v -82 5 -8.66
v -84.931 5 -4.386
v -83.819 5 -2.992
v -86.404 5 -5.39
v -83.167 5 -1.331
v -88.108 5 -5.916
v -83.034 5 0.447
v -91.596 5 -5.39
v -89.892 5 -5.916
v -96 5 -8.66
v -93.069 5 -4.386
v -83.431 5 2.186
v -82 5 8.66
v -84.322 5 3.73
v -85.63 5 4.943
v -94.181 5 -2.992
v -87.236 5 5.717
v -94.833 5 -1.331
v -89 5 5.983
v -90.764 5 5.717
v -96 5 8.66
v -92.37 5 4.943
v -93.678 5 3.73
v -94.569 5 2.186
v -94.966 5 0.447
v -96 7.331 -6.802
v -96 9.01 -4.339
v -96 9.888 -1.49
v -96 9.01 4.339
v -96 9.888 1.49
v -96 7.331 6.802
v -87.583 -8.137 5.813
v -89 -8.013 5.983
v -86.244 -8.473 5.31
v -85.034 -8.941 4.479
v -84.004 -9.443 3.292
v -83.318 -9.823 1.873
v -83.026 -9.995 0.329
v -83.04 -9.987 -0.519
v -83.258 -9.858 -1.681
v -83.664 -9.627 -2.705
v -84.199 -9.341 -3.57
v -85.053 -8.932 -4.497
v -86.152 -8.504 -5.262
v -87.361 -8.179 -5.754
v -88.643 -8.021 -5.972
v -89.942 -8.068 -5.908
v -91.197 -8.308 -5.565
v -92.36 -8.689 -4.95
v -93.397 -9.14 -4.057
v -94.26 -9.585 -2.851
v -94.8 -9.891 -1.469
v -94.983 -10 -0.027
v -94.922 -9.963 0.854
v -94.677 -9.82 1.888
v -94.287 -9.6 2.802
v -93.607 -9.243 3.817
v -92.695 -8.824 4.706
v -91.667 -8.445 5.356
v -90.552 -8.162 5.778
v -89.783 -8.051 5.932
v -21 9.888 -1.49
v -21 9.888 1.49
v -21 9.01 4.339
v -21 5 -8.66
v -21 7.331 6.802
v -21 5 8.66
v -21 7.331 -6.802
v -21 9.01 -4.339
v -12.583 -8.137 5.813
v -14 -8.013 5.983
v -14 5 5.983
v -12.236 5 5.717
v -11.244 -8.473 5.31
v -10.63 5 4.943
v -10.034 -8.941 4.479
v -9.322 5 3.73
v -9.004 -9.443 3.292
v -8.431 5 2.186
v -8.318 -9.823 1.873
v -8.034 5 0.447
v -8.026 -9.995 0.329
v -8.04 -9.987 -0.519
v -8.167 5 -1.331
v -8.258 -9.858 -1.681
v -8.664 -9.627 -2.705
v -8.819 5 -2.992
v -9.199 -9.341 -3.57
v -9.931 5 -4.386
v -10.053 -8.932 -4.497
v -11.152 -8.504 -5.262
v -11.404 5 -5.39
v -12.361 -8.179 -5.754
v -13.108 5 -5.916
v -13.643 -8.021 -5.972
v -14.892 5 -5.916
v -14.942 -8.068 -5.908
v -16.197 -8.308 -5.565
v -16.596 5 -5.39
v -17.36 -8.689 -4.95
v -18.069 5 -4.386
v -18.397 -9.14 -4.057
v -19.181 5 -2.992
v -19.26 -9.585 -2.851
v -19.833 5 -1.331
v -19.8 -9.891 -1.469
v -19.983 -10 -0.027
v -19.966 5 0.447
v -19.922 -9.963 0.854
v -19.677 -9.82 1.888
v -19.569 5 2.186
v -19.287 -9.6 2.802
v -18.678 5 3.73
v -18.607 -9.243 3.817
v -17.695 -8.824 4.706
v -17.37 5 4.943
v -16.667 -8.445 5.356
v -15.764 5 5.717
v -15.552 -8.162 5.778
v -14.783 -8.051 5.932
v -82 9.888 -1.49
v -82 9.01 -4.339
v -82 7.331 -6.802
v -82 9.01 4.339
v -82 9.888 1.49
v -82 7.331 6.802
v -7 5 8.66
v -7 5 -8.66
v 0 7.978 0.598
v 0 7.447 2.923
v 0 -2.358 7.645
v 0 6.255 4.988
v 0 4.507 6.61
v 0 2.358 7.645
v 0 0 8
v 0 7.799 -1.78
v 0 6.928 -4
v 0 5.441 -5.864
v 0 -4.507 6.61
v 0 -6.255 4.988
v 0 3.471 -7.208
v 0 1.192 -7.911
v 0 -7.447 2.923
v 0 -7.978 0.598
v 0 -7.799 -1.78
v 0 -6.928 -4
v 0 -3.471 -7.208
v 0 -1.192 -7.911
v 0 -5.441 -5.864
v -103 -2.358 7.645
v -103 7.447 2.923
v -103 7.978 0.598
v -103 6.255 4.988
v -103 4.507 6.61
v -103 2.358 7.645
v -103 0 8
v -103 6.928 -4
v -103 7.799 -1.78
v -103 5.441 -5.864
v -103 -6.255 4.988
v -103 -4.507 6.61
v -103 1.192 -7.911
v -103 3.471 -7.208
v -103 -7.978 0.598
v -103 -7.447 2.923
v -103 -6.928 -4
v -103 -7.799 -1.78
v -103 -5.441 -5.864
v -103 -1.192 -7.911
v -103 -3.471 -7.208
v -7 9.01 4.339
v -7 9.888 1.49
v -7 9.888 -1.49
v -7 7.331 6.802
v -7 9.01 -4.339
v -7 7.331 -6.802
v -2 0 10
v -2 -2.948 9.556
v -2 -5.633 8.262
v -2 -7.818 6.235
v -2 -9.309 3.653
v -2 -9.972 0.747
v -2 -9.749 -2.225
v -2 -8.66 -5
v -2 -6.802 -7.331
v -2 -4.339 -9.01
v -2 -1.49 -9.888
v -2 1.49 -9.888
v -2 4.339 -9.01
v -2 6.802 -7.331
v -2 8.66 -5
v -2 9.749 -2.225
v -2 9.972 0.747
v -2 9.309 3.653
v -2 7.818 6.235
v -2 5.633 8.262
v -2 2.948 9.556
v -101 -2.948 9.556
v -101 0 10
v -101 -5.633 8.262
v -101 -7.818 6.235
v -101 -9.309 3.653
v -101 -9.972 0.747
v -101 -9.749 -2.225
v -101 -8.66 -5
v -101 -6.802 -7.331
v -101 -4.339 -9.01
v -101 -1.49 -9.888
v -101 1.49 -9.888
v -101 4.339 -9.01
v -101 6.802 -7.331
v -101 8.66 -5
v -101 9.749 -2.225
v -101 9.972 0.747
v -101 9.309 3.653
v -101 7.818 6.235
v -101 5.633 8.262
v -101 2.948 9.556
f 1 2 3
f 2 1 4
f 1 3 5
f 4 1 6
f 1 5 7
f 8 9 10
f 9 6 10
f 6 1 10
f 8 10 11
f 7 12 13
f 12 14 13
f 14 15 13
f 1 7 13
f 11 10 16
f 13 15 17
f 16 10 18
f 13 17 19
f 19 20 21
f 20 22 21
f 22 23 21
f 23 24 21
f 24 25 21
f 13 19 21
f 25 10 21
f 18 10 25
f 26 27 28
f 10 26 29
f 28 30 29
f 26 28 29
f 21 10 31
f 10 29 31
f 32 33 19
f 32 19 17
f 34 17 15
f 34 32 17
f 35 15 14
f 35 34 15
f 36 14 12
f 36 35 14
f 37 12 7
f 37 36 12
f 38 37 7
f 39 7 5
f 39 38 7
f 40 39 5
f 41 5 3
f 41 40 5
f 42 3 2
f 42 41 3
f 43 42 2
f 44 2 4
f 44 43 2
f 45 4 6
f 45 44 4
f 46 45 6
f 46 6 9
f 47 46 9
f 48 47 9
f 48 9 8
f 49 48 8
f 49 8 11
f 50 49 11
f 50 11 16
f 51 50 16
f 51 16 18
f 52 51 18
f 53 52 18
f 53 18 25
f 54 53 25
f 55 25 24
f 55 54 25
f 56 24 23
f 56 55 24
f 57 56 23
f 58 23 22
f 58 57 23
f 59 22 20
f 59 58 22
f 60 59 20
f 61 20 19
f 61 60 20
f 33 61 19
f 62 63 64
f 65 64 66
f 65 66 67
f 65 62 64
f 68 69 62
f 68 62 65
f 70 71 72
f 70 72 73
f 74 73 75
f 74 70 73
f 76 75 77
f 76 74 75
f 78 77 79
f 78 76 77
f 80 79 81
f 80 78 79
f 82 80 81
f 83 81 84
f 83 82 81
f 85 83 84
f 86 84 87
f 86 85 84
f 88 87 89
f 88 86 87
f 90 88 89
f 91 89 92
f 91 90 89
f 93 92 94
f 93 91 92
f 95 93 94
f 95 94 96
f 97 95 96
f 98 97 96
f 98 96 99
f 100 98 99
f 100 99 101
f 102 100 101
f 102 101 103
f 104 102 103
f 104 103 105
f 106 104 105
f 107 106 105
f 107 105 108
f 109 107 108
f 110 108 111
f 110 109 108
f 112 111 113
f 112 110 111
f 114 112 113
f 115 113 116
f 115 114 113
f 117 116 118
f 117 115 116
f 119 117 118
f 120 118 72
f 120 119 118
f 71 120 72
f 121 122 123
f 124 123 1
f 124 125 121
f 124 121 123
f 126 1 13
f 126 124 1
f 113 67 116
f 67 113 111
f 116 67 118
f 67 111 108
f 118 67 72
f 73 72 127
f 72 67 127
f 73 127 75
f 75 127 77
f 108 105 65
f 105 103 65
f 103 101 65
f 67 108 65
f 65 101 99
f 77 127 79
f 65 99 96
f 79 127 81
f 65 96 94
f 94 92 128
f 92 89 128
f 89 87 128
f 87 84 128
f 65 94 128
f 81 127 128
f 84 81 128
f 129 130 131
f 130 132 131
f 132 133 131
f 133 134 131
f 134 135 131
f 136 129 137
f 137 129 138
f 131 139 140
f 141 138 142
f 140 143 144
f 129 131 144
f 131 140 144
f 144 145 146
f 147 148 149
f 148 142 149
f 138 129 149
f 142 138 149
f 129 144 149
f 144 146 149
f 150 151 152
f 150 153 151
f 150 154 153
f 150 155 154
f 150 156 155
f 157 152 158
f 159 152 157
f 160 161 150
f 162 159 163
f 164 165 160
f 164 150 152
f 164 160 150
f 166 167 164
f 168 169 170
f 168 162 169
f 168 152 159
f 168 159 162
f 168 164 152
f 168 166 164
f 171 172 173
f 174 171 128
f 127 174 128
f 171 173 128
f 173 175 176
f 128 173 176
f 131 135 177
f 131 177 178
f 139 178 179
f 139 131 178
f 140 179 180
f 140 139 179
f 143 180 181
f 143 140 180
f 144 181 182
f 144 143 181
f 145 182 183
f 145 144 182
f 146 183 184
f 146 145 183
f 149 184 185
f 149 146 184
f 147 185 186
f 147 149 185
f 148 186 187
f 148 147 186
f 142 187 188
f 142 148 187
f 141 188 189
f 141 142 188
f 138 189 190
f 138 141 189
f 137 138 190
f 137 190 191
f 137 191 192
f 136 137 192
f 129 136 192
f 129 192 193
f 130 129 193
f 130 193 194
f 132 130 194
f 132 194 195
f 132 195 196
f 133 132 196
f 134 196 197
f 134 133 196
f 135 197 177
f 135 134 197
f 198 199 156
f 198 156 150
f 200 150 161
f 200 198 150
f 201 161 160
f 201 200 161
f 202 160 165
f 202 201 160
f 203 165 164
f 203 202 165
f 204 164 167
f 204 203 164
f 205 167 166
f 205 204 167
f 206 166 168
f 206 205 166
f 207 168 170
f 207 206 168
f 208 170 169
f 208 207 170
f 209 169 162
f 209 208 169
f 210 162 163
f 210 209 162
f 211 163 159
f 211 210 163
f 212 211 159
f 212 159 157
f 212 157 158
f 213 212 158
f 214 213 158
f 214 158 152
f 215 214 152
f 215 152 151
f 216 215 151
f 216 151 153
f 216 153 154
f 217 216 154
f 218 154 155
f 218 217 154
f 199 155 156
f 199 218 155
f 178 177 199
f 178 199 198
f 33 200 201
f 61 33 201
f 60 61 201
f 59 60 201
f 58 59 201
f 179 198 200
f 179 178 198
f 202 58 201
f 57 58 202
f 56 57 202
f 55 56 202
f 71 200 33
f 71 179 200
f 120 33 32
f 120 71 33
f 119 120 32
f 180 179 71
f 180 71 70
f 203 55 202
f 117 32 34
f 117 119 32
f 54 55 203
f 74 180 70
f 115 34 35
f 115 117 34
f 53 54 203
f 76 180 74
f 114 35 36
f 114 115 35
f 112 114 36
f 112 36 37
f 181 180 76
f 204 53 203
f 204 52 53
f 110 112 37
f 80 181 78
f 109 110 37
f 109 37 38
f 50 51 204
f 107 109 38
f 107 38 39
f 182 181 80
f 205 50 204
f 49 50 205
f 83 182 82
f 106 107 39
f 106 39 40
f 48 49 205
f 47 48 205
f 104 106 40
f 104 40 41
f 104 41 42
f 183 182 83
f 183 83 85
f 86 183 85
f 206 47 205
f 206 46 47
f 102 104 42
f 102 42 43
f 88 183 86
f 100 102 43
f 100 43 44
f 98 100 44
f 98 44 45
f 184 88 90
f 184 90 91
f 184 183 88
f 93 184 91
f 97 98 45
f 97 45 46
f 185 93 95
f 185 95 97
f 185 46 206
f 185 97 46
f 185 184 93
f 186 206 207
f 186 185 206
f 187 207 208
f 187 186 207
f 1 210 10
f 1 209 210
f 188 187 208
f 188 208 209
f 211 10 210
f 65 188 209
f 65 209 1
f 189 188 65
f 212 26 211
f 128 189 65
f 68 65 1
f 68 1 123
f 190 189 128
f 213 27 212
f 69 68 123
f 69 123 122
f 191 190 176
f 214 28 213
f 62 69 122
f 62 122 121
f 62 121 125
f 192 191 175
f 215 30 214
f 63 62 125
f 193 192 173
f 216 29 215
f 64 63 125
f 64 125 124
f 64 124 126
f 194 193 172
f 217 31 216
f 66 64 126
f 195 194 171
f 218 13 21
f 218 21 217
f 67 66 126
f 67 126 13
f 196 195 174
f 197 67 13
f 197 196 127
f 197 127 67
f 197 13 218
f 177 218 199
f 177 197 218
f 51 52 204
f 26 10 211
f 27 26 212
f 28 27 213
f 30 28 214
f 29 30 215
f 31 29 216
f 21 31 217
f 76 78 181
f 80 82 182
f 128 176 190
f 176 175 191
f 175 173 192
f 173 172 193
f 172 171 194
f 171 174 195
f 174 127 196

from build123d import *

# Parameters (mm, degrees)
SKETCH1_W               = 103
SKETCH1_H               = 10
CUT_EXTRUDE1_START      = -7
CUT_EXTRUDE1_DEPTH      = 14
CUT_EXTRUDE2_START      = -7
CUT_EXTRUDE2_DEPTH      = 14
CUT_EXTRUDE3_DEPTH      = 104.966340707
CUT_EXTRUDE3_DEPTH_BACK = 104.966340707
SKETCH4_R               = 5.983
CHAMFER1_SIZE           = 2


with BuildPart() as part:
    # Sketch1 → Revolve1 (revolve)
    with BuildSketch(Plane.XY, mode=Mode.PRIVATE) as revolve1_sk:
        with Locations((-51.5, 5)):
            Rectangle(SKETCH1_W, SKETCH1_H)
    revolve(revolve1_sk.sketch.rotate(Axis((-103, 0, 0), (1, 0, 0)), 90), axis=Axis((-103, 0, 0), (1, 0, 0)))

    # Sketch2 → Cut-Extrude1 (cut)
    with BuildSketch(Plane(origin=(0, 0, 0), x_dir=(0, 0, -1), z_dir=(1, 0, 0)).offset(CUT_EXTRUDE1_START)):
        with BuildLine():
            Line((-10.872335562, 5), (10.872335562, 5))
            ThreePointArc((10.872335562, 5), (0, 11.966941154), (-10.872335562, 5))
        make_face()
    extrude(amount=-CUT_EXTRUDE1_DEPTH, mode=Mode.SUBTRACT)

    # Sketch3 → Cut-Extrude2 (cut)
    with BuildSketch(Plane.ZY.offset(103).offset(CUT_EXTRUDE2_START)):
        with BuildLine():
            Line((-15, 5), (15, 5))
            ThreePointArc((15, 5), (0, 15.811388301), (-15, 5))
        make_face()
    extrude(amount=-CUT_EXTRUDE2_DEPTH, mode=Mode.SUBTRACT)

    # Sketch4 → Cut-Extrude3 (cut, two sides: drawn at the far end of the back side and taken through both)
    with BuildSketch(Plane(origin=(0, 0, 0), x_dir=(1, 0, 0), z_dir=(0, 1, 0)).offset(-CUT_EXTRUDE3_DEPTH_BACK)):
        with Locations(Location((-89, 0, 0), (0, 0, 270))):
            Circle(SKETCH4_R)
        with Locations(Location((-14, 0, 0), (0, 0, 270))):
            Circle(SKETCH4_R)
    extrude(amount=CUT_EXTRUDE3_DEPTH + CUT_EXTRUDE3_DEPTH_BACK, mode=Mode.SUBTRACT)

    # Chamfer1
    chamfer1_edges = [part.edges().sort_by_distance(p)[0] for p in [
        (0, 0, -10),
        (-103, 0, -10),
    ]]
    chamfer(chamfer1_edges, length=CHAMFER1_SIZE)


solid = part.part
